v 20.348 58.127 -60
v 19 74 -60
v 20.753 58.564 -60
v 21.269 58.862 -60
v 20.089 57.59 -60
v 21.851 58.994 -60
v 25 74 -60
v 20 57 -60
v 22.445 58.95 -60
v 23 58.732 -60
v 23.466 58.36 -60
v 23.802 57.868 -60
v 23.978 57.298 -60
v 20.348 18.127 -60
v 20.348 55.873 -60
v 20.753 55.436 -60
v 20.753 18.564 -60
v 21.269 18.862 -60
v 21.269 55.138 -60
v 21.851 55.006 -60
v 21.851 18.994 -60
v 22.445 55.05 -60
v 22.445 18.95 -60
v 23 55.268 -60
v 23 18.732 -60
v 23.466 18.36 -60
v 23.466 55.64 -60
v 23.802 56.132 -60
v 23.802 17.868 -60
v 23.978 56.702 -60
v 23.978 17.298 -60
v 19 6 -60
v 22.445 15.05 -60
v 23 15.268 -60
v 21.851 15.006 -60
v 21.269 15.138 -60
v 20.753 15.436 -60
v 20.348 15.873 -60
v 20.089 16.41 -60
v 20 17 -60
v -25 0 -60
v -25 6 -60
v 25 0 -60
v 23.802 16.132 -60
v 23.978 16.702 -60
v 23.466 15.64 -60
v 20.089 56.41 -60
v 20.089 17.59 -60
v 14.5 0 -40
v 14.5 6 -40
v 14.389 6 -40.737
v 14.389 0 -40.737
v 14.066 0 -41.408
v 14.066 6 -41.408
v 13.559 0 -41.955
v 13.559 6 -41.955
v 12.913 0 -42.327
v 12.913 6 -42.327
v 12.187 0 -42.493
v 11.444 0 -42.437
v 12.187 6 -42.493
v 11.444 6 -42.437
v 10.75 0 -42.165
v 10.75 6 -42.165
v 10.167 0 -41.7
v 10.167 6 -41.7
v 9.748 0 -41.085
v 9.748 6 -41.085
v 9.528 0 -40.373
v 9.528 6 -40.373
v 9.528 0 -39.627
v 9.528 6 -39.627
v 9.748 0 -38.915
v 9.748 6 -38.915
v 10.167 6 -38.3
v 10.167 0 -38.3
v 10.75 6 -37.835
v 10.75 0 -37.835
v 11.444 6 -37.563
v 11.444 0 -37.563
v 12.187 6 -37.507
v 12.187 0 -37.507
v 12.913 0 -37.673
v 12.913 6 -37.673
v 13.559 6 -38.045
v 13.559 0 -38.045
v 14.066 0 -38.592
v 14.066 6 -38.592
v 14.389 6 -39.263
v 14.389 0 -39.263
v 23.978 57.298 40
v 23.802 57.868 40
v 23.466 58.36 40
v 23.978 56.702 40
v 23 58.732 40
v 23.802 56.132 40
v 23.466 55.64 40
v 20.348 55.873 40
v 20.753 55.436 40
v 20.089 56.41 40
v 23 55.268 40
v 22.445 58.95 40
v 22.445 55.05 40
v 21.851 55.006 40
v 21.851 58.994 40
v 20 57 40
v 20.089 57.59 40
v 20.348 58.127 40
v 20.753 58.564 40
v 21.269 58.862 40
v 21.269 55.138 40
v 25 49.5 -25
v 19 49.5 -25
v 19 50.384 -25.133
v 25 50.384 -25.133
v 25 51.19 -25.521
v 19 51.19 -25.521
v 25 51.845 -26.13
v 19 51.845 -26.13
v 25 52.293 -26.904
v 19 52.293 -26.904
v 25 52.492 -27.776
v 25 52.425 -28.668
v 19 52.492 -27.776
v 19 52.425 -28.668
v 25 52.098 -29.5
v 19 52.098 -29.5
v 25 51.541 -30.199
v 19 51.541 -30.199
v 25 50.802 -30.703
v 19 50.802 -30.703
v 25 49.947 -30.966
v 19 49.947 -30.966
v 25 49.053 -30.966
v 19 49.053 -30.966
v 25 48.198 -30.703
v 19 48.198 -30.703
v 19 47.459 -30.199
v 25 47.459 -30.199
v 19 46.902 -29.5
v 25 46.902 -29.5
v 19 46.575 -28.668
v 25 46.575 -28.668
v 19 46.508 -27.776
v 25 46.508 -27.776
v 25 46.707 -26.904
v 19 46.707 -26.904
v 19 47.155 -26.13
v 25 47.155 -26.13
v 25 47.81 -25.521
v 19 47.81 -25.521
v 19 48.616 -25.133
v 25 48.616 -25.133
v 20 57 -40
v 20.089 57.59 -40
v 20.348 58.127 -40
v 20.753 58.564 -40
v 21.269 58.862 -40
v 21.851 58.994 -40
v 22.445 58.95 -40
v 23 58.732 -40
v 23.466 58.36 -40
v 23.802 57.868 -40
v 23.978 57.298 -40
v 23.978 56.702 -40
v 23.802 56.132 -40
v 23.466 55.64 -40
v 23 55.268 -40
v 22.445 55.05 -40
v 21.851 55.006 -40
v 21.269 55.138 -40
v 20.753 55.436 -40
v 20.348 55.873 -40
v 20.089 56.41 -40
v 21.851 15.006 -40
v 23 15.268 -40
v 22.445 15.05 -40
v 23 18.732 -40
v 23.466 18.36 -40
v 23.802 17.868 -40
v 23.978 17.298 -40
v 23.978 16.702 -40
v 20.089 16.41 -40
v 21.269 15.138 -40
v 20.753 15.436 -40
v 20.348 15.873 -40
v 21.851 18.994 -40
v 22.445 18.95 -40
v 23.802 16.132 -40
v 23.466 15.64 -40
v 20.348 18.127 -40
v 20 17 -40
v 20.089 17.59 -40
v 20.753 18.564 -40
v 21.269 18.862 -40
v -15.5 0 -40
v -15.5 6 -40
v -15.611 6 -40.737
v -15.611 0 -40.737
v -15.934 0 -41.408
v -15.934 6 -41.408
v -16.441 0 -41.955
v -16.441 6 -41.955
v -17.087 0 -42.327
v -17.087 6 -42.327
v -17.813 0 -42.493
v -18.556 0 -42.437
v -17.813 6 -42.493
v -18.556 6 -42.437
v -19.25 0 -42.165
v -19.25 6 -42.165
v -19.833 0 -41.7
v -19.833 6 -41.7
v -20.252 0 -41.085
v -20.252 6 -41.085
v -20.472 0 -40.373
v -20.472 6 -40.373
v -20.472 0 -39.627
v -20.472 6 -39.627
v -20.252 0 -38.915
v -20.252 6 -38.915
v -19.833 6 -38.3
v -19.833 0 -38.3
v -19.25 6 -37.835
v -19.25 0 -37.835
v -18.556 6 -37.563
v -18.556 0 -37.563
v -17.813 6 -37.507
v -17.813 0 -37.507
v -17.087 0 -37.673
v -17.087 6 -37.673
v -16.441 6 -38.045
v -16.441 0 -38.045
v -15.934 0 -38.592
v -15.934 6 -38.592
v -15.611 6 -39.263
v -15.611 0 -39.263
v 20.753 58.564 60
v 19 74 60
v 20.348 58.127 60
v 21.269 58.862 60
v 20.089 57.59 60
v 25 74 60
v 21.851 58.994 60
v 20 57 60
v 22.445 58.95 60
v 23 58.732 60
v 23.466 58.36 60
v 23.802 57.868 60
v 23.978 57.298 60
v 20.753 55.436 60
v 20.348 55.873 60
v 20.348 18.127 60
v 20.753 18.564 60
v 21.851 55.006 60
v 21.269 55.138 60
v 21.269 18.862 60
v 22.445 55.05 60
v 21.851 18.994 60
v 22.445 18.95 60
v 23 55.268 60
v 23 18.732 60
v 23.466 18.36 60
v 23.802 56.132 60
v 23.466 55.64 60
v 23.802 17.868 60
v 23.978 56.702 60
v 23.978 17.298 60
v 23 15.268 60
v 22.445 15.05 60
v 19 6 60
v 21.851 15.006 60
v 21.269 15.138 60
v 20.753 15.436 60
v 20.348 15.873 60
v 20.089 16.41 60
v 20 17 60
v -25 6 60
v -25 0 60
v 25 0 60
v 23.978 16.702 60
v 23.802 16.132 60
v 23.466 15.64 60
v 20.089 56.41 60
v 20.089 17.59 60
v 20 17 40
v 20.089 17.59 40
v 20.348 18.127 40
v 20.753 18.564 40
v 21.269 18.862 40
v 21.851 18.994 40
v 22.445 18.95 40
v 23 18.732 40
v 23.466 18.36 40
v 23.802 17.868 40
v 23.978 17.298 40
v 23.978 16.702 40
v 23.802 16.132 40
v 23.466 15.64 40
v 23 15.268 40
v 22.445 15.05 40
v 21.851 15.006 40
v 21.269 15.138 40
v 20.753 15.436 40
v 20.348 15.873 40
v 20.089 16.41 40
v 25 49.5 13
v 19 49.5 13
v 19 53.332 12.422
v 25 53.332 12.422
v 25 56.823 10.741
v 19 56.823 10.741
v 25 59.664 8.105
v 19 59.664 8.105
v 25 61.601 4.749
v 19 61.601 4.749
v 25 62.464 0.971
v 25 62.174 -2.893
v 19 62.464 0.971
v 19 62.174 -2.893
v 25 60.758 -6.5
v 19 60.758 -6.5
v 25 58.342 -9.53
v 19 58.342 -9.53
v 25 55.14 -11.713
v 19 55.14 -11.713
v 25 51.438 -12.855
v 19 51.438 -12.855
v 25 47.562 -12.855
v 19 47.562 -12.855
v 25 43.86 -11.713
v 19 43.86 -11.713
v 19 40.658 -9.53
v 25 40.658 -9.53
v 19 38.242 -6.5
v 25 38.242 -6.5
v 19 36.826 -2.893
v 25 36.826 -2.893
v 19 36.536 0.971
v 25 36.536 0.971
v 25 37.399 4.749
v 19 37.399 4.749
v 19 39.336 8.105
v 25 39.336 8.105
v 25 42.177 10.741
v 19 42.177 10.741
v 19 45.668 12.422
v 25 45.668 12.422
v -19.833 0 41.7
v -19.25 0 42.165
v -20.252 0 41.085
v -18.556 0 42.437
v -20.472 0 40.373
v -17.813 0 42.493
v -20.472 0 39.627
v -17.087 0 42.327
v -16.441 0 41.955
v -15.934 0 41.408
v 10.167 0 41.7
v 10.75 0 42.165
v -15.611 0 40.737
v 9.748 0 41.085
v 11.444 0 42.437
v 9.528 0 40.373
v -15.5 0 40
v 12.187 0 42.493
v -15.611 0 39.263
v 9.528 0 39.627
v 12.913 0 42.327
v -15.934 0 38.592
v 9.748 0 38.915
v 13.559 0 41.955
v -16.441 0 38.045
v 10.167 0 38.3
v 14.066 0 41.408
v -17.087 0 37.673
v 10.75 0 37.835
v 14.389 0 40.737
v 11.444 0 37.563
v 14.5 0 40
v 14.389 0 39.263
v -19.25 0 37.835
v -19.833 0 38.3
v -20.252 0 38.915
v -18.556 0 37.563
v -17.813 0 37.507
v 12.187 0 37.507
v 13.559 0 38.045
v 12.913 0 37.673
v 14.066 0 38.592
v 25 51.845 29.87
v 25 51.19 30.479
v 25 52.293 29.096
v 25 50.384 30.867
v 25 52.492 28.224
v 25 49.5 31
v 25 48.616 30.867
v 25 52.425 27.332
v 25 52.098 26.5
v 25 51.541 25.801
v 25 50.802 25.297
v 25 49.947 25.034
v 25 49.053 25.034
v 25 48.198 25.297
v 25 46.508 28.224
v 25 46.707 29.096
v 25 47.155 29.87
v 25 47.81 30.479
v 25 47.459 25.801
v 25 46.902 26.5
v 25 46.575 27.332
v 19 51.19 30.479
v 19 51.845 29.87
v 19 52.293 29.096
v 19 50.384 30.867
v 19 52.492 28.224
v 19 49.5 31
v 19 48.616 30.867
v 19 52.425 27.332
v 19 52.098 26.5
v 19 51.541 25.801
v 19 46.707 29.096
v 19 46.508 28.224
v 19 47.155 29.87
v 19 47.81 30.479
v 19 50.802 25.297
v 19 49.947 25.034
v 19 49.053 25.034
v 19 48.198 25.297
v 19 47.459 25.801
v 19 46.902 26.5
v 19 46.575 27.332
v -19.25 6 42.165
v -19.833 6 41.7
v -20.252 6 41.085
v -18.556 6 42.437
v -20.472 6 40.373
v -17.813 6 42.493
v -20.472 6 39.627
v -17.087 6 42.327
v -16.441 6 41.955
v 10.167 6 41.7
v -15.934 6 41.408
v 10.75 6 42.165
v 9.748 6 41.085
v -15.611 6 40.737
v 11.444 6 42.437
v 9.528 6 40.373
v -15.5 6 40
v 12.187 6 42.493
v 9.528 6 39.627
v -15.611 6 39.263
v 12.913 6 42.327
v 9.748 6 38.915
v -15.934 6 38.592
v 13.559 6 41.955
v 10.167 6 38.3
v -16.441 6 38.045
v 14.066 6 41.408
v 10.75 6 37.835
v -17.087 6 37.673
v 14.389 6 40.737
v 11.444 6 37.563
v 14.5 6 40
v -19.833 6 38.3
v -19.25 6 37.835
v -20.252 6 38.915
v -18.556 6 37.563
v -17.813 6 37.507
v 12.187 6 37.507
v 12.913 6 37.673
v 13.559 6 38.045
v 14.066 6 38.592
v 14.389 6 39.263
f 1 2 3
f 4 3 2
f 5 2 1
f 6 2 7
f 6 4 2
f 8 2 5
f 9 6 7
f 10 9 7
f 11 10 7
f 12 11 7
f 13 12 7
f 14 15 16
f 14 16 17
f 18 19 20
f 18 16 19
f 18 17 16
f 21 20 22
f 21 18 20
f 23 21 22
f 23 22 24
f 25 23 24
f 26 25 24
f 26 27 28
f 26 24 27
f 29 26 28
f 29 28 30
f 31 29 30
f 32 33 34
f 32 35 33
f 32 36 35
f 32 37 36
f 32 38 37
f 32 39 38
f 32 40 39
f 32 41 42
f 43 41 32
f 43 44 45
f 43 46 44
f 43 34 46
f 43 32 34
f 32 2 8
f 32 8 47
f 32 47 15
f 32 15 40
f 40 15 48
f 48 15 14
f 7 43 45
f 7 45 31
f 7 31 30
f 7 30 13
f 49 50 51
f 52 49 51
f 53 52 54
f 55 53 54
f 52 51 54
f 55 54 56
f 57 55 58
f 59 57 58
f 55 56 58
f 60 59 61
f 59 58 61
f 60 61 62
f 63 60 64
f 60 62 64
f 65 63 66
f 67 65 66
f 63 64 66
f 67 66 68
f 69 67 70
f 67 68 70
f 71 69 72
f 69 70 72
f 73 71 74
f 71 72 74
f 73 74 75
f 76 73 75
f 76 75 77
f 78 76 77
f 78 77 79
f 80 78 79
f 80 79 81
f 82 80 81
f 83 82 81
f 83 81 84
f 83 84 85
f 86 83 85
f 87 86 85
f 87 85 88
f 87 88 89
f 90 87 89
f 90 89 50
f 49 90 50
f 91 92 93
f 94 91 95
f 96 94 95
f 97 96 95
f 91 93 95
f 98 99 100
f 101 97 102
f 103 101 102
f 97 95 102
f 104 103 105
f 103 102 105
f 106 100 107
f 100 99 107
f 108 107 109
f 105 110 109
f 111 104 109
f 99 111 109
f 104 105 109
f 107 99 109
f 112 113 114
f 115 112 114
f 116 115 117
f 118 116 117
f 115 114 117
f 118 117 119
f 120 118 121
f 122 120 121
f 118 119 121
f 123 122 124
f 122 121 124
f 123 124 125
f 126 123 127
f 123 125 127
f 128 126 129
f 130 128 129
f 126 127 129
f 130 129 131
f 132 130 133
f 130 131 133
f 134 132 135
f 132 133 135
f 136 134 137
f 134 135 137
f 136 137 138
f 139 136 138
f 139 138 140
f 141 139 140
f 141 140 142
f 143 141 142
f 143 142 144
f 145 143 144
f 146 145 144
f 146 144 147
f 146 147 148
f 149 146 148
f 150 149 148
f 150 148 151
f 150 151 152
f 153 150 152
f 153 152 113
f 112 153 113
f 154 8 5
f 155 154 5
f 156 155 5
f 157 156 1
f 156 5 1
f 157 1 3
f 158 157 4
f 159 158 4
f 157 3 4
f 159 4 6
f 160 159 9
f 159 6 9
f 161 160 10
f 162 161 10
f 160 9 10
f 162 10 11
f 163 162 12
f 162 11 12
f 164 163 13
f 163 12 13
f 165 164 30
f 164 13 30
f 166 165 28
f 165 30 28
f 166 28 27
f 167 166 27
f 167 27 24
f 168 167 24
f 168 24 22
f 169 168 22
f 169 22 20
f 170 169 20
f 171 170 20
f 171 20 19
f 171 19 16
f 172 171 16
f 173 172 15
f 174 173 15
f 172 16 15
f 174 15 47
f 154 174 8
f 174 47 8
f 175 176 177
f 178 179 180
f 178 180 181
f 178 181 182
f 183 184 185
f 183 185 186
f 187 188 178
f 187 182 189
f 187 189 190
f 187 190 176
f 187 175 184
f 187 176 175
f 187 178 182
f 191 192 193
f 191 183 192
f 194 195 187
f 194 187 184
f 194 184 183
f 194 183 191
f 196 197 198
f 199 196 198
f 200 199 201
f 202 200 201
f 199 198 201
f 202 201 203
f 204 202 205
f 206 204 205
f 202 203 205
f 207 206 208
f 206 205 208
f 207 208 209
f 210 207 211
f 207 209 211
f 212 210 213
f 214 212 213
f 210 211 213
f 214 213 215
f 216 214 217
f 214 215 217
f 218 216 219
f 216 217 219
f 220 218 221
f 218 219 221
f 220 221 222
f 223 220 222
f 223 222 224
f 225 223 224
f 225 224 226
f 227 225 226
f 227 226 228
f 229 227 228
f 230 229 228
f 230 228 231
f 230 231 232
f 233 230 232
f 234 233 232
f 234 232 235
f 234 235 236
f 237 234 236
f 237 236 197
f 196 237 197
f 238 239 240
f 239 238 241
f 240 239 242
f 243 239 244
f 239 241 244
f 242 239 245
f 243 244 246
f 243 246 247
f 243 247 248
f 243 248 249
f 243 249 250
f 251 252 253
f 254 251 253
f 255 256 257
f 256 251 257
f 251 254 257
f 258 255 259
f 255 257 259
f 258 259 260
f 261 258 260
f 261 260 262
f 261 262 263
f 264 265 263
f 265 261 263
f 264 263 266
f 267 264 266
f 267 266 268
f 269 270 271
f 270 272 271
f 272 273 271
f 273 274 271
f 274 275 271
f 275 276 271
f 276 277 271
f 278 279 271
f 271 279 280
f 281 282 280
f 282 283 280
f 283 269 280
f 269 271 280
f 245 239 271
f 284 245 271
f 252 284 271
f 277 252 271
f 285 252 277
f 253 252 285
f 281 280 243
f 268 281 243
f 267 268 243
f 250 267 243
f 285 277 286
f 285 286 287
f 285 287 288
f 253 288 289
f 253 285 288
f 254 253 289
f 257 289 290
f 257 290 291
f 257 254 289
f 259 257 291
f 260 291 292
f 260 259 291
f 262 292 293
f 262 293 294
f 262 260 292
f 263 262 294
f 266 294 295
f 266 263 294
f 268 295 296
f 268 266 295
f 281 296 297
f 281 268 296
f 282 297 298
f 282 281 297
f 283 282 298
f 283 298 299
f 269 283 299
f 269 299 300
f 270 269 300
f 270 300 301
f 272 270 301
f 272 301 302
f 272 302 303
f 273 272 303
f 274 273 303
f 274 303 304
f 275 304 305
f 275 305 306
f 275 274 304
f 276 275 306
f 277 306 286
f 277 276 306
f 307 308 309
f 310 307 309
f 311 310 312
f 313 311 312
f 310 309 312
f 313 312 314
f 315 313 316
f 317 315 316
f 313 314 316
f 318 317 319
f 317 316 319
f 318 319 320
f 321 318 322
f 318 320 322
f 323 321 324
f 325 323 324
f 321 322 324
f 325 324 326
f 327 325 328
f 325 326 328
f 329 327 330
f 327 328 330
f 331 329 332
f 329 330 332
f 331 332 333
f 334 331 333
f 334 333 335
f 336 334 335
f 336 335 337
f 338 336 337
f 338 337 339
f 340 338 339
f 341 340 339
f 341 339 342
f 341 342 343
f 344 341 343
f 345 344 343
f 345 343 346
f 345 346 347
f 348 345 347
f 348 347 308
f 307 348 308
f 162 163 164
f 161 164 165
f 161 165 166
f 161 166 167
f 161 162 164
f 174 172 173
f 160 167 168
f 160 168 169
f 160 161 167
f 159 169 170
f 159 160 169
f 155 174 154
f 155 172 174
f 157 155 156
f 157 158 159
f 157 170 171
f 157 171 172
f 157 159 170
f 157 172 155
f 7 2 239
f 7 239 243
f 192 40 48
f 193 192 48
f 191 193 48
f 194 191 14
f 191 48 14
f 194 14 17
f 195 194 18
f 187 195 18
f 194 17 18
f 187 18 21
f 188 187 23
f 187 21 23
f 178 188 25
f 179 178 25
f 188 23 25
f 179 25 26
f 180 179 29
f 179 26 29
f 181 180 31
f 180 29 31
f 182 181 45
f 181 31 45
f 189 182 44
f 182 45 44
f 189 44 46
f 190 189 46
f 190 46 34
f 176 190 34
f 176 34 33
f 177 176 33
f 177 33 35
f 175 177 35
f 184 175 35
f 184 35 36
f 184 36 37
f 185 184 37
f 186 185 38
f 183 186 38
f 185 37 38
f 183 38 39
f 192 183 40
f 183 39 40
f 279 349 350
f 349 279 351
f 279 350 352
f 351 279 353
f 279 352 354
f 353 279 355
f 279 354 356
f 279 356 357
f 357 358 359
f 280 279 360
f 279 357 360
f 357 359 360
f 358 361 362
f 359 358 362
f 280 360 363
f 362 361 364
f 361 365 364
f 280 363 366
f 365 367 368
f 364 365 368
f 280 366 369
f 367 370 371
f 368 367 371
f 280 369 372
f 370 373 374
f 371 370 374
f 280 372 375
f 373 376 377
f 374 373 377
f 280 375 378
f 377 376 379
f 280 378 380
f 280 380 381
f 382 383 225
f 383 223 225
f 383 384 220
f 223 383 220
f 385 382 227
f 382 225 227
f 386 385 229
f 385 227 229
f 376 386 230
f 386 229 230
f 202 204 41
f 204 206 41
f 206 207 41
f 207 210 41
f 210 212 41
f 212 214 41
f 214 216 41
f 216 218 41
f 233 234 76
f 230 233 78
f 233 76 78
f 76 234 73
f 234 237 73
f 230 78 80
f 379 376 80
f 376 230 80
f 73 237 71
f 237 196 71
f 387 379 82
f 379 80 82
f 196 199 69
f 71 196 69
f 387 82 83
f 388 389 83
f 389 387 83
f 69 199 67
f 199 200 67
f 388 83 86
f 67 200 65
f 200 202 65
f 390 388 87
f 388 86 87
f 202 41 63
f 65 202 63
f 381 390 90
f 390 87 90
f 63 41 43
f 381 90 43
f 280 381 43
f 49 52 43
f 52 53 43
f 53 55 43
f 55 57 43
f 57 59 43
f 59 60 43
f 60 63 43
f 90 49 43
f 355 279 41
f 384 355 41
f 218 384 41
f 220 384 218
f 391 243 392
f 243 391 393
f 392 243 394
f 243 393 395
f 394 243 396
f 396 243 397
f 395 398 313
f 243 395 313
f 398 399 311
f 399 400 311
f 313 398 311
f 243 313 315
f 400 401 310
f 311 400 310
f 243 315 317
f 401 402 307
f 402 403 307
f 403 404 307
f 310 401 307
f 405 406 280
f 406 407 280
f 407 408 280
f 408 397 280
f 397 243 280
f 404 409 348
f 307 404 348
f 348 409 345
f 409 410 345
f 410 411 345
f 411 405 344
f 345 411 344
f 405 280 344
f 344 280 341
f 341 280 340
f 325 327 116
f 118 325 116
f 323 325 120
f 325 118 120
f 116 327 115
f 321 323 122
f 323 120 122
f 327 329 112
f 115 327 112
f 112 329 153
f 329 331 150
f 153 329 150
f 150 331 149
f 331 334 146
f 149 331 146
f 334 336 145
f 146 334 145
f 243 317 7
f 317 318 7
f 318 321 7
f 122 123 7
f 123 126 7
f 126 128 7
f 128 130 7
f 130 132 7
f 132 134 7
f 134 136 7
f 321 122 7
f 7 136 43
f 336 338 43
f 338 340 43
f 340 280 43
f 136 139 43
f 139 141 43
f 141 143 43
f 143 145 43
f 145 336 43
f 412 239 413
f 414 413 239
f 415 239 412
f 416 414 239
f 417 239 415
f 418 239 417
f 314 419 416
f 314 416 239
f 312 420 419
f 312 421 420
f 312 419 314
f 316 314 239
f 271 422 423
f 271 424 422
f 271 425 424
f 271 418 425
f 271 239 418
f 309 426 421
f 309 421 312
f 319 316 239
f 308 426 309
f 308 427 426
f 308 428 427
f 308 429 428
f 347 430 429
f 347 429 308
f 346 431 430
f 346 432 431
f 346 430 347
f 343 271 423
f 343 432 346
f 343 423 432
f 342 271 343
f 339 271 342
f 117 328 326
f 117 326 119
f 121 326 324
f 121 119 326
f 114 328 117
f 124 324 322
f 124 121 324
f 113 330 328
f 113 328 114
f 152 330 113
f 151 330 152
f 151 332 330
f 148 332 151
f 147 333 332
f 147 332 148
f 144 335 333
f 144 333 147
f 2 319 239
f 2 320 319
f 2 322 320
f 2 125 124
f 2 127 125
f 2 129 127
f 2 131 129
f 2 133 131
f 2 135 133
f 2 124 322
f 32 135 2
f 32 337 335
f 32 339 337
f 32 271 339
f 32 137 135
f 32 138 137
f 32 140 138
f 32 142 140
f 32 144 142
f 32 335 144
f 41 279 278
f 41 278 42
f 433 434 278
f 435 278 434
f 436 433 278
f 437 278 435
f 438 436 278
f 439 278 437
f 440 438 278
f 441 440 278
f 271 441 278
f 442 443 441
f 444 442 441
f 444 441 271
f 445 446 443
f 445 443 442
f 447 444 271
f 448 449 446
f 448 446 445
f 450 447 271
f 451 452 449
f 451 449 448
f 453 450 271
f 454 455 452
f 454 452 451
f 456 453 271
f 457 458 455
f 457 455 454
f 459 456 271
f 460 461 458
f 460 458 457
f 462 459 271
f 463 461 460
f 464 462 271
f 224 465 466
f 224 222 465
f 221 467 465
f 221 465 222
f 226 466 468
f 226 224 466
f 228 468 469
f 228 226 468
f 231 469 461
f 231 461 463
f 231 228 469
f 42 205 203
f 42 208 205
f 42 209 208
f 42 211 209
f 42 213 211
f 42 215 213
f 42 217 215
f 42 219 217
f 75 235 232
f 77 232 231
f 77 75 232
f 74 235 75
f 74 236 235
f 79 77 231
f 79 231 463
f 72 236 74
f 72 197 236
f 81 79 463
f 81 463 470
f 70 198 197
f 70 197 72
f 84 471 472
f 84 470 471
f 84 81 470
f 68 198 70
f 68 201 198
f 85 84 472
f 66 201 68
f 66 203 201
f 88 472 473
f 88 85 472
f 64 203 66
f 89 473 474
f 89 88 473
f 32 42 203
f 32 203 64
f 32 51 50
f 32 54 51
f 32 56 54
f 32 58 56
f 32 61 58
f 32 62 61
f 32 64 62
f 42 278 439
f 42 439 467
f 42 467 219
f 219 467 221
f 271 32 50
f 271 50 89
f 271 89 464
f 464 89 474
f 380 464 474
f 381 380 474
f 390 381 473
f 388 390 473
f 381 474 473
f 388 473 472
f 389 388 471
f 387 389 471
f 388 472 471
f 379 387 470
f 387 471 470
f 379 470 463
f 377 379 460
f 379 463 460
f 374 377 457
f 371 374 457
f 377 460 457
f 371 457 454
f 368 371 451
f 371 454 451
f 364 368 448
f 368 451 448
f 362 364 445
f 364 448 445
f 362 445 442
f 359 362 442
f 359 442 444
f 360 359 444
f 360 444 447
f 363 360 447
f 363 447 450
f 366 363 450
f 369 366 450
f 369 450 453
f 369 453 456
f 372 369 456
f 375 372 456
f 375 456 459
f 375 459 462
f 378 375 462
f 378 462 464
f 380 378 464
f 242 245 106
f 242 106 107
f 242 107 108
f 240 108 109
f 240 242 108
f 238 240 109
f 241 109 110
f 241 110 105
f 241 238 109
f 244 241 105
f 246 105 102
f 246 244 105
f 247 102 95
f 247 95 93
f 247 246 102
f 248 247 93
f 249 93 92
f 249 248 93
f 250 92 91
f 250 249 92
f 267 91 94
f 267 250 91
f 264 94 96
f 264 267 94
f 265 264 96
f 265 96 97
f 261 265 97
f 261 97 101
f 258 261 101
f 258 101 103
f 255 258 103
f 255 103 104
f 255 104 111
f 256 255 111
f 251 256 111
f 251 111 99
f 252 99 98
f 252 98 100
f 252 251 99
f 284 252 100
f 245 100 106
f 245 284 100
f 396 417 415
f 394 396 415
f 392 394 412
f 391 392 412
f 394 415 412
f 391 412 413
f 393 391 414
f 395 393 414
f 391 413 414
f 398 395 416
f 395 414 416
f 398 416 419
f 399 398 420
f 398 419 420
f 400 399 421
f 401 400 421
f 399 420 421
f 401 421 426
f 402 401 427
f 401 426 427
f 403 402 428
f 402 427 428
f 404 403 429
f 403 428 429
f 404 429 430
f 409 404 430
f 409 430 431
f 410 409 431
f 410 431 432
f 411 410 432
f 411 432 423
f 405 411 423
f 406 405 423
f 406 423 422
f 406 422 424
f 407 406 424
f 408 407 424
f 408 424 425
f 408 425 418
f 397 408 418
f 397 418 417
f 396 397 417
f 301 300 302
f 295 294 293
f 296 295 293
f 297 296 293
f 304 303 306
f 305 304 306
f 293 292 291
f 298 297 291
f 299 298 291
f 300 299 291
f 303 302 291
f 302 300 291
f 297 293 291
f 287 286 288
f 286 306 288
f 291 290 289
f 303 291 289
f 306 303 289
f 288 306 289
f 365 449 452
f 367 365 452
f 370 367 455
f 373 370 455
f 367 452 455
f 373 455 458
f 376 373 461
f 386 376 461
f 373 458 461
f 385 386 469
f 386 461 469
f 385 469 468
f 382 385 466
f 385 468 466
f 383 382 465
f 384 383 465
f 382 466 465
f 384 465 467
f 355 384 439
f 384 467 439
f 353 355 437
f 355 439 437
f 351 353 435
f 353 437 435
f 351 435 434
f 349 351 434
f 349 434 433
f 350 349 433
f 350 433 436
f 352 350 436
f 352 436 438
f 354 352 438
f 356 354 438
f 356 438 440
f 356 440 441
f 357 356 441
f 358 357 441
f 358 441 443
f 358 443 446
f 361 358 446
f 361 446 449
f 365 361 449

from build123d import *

# Parameters (mm, degrees)
SKETCH_1_W          = 44
SKETCH_1_H          = 120
EXTRUDE_1_DEPTH     = 6
SKETCH_1_3_W        = 6
SKETCH_1_3_H        = 120
EXTRUDE_2_DEPTH     = 74
SKETCH_2_R          = 13
SKETCH_2_R_2        = 3
CUT_EXTRUDE_1_DEPTH = 7
SKETCH_3_R          = 2.5
CUT_EXTRUDE_2_DEPTH = 10
SKETCH_4_R          = 2
CUT_EXTRUDE_3_DEPTH = 20


with BuildPart() as part:
    # Sketch 1 → Extrude 1 (new body)
    with BuildSketch(Plane(origin=(0, 0, 0), x_dir=(1, 0, 0), z_dir=(0, 1, 0))):
        with Locations((-3, 0)):
            Rectangle(SKETCH_1_W, SKETCH_1_H)
    extrude(amount=EXTRUDE_1_DEPTH)

    # Sketch 1_3 → Extrude 2 (add)
    with BuildSketch(Plane(origin=(0, 0, 0), x_dir=(1, 0, 0), z_dir=(0, 1, 0))):
        with Locations((22, 0)):
            Rectangle(SKETCH_1_3_W, SKETCH_1_3_H)
    extrude(amount=EXTRUDE_2_DEPTH)

    # Sketch 2 → Cut-Extrude 1 (cut, through all)
    with BuildSketch(Plane.ZY.offset(-19)):
        with Locations((0, 49.5)):
            Circle(SKETCH_2_R)
        with Locations((-28, 49.5)):
            Circle(SKETCH_2_R_2)
        with Locations((28, 49.5)):
            Circle(SKETCH_2_R_2)
    extrude(amount=-CUT_EXTRUDE_1_DEPTH, mode=Mode.SUBTRACT)

    # Sketch 3 → Cut-Extrude 2 (cut)
    with BuildSketch(Plane(origin=(0, 6, 0), x_dir=(1, 0, 0), z_dir=(0, 1, 0))):
        with Locations((-18, 40)):
            Circle(SKETCH_3_R)
        with Locations((12, 40)):
            Circle(SKETCH_3_R)
        with Locations((-18, -40)):
            Circle(SKETCH_3_R)
        with Locations((12, -40)):
            Circle(SKETCH_3_R)
    extrude(amount=-CUT_EXTRUDE_2_DEPTH, mode=Mode.SUBTRACT)

    # Sketch 4 → Cut-Extrude 3 (cut)
    with BuildSketch(Plane(origin=(0, 0, -60), x_dir=(-1, 0, 0), z_dir=(0, 0, -1))):
        with Locations((-22, 17)):
            Circle(SKETCH_4_R)
        with Locations((-22, 57)):
            Circle(SKETCH_4_R)
    cut_extrude_3 = extrude(amount=-CUT_EXTRUDE_3_DEPTH, mode=Mode.SUBTRACT)

    # Mirror 1: Cut-Extrude 3 across plane
    add(cut_extrude_3.mirror(Plane(origin=(0, 0, 0), x_dir=(1, 0, 0), z_dir=(0, 0, -1))), mode=Mode.SUBTRACT)


solid = part.part
